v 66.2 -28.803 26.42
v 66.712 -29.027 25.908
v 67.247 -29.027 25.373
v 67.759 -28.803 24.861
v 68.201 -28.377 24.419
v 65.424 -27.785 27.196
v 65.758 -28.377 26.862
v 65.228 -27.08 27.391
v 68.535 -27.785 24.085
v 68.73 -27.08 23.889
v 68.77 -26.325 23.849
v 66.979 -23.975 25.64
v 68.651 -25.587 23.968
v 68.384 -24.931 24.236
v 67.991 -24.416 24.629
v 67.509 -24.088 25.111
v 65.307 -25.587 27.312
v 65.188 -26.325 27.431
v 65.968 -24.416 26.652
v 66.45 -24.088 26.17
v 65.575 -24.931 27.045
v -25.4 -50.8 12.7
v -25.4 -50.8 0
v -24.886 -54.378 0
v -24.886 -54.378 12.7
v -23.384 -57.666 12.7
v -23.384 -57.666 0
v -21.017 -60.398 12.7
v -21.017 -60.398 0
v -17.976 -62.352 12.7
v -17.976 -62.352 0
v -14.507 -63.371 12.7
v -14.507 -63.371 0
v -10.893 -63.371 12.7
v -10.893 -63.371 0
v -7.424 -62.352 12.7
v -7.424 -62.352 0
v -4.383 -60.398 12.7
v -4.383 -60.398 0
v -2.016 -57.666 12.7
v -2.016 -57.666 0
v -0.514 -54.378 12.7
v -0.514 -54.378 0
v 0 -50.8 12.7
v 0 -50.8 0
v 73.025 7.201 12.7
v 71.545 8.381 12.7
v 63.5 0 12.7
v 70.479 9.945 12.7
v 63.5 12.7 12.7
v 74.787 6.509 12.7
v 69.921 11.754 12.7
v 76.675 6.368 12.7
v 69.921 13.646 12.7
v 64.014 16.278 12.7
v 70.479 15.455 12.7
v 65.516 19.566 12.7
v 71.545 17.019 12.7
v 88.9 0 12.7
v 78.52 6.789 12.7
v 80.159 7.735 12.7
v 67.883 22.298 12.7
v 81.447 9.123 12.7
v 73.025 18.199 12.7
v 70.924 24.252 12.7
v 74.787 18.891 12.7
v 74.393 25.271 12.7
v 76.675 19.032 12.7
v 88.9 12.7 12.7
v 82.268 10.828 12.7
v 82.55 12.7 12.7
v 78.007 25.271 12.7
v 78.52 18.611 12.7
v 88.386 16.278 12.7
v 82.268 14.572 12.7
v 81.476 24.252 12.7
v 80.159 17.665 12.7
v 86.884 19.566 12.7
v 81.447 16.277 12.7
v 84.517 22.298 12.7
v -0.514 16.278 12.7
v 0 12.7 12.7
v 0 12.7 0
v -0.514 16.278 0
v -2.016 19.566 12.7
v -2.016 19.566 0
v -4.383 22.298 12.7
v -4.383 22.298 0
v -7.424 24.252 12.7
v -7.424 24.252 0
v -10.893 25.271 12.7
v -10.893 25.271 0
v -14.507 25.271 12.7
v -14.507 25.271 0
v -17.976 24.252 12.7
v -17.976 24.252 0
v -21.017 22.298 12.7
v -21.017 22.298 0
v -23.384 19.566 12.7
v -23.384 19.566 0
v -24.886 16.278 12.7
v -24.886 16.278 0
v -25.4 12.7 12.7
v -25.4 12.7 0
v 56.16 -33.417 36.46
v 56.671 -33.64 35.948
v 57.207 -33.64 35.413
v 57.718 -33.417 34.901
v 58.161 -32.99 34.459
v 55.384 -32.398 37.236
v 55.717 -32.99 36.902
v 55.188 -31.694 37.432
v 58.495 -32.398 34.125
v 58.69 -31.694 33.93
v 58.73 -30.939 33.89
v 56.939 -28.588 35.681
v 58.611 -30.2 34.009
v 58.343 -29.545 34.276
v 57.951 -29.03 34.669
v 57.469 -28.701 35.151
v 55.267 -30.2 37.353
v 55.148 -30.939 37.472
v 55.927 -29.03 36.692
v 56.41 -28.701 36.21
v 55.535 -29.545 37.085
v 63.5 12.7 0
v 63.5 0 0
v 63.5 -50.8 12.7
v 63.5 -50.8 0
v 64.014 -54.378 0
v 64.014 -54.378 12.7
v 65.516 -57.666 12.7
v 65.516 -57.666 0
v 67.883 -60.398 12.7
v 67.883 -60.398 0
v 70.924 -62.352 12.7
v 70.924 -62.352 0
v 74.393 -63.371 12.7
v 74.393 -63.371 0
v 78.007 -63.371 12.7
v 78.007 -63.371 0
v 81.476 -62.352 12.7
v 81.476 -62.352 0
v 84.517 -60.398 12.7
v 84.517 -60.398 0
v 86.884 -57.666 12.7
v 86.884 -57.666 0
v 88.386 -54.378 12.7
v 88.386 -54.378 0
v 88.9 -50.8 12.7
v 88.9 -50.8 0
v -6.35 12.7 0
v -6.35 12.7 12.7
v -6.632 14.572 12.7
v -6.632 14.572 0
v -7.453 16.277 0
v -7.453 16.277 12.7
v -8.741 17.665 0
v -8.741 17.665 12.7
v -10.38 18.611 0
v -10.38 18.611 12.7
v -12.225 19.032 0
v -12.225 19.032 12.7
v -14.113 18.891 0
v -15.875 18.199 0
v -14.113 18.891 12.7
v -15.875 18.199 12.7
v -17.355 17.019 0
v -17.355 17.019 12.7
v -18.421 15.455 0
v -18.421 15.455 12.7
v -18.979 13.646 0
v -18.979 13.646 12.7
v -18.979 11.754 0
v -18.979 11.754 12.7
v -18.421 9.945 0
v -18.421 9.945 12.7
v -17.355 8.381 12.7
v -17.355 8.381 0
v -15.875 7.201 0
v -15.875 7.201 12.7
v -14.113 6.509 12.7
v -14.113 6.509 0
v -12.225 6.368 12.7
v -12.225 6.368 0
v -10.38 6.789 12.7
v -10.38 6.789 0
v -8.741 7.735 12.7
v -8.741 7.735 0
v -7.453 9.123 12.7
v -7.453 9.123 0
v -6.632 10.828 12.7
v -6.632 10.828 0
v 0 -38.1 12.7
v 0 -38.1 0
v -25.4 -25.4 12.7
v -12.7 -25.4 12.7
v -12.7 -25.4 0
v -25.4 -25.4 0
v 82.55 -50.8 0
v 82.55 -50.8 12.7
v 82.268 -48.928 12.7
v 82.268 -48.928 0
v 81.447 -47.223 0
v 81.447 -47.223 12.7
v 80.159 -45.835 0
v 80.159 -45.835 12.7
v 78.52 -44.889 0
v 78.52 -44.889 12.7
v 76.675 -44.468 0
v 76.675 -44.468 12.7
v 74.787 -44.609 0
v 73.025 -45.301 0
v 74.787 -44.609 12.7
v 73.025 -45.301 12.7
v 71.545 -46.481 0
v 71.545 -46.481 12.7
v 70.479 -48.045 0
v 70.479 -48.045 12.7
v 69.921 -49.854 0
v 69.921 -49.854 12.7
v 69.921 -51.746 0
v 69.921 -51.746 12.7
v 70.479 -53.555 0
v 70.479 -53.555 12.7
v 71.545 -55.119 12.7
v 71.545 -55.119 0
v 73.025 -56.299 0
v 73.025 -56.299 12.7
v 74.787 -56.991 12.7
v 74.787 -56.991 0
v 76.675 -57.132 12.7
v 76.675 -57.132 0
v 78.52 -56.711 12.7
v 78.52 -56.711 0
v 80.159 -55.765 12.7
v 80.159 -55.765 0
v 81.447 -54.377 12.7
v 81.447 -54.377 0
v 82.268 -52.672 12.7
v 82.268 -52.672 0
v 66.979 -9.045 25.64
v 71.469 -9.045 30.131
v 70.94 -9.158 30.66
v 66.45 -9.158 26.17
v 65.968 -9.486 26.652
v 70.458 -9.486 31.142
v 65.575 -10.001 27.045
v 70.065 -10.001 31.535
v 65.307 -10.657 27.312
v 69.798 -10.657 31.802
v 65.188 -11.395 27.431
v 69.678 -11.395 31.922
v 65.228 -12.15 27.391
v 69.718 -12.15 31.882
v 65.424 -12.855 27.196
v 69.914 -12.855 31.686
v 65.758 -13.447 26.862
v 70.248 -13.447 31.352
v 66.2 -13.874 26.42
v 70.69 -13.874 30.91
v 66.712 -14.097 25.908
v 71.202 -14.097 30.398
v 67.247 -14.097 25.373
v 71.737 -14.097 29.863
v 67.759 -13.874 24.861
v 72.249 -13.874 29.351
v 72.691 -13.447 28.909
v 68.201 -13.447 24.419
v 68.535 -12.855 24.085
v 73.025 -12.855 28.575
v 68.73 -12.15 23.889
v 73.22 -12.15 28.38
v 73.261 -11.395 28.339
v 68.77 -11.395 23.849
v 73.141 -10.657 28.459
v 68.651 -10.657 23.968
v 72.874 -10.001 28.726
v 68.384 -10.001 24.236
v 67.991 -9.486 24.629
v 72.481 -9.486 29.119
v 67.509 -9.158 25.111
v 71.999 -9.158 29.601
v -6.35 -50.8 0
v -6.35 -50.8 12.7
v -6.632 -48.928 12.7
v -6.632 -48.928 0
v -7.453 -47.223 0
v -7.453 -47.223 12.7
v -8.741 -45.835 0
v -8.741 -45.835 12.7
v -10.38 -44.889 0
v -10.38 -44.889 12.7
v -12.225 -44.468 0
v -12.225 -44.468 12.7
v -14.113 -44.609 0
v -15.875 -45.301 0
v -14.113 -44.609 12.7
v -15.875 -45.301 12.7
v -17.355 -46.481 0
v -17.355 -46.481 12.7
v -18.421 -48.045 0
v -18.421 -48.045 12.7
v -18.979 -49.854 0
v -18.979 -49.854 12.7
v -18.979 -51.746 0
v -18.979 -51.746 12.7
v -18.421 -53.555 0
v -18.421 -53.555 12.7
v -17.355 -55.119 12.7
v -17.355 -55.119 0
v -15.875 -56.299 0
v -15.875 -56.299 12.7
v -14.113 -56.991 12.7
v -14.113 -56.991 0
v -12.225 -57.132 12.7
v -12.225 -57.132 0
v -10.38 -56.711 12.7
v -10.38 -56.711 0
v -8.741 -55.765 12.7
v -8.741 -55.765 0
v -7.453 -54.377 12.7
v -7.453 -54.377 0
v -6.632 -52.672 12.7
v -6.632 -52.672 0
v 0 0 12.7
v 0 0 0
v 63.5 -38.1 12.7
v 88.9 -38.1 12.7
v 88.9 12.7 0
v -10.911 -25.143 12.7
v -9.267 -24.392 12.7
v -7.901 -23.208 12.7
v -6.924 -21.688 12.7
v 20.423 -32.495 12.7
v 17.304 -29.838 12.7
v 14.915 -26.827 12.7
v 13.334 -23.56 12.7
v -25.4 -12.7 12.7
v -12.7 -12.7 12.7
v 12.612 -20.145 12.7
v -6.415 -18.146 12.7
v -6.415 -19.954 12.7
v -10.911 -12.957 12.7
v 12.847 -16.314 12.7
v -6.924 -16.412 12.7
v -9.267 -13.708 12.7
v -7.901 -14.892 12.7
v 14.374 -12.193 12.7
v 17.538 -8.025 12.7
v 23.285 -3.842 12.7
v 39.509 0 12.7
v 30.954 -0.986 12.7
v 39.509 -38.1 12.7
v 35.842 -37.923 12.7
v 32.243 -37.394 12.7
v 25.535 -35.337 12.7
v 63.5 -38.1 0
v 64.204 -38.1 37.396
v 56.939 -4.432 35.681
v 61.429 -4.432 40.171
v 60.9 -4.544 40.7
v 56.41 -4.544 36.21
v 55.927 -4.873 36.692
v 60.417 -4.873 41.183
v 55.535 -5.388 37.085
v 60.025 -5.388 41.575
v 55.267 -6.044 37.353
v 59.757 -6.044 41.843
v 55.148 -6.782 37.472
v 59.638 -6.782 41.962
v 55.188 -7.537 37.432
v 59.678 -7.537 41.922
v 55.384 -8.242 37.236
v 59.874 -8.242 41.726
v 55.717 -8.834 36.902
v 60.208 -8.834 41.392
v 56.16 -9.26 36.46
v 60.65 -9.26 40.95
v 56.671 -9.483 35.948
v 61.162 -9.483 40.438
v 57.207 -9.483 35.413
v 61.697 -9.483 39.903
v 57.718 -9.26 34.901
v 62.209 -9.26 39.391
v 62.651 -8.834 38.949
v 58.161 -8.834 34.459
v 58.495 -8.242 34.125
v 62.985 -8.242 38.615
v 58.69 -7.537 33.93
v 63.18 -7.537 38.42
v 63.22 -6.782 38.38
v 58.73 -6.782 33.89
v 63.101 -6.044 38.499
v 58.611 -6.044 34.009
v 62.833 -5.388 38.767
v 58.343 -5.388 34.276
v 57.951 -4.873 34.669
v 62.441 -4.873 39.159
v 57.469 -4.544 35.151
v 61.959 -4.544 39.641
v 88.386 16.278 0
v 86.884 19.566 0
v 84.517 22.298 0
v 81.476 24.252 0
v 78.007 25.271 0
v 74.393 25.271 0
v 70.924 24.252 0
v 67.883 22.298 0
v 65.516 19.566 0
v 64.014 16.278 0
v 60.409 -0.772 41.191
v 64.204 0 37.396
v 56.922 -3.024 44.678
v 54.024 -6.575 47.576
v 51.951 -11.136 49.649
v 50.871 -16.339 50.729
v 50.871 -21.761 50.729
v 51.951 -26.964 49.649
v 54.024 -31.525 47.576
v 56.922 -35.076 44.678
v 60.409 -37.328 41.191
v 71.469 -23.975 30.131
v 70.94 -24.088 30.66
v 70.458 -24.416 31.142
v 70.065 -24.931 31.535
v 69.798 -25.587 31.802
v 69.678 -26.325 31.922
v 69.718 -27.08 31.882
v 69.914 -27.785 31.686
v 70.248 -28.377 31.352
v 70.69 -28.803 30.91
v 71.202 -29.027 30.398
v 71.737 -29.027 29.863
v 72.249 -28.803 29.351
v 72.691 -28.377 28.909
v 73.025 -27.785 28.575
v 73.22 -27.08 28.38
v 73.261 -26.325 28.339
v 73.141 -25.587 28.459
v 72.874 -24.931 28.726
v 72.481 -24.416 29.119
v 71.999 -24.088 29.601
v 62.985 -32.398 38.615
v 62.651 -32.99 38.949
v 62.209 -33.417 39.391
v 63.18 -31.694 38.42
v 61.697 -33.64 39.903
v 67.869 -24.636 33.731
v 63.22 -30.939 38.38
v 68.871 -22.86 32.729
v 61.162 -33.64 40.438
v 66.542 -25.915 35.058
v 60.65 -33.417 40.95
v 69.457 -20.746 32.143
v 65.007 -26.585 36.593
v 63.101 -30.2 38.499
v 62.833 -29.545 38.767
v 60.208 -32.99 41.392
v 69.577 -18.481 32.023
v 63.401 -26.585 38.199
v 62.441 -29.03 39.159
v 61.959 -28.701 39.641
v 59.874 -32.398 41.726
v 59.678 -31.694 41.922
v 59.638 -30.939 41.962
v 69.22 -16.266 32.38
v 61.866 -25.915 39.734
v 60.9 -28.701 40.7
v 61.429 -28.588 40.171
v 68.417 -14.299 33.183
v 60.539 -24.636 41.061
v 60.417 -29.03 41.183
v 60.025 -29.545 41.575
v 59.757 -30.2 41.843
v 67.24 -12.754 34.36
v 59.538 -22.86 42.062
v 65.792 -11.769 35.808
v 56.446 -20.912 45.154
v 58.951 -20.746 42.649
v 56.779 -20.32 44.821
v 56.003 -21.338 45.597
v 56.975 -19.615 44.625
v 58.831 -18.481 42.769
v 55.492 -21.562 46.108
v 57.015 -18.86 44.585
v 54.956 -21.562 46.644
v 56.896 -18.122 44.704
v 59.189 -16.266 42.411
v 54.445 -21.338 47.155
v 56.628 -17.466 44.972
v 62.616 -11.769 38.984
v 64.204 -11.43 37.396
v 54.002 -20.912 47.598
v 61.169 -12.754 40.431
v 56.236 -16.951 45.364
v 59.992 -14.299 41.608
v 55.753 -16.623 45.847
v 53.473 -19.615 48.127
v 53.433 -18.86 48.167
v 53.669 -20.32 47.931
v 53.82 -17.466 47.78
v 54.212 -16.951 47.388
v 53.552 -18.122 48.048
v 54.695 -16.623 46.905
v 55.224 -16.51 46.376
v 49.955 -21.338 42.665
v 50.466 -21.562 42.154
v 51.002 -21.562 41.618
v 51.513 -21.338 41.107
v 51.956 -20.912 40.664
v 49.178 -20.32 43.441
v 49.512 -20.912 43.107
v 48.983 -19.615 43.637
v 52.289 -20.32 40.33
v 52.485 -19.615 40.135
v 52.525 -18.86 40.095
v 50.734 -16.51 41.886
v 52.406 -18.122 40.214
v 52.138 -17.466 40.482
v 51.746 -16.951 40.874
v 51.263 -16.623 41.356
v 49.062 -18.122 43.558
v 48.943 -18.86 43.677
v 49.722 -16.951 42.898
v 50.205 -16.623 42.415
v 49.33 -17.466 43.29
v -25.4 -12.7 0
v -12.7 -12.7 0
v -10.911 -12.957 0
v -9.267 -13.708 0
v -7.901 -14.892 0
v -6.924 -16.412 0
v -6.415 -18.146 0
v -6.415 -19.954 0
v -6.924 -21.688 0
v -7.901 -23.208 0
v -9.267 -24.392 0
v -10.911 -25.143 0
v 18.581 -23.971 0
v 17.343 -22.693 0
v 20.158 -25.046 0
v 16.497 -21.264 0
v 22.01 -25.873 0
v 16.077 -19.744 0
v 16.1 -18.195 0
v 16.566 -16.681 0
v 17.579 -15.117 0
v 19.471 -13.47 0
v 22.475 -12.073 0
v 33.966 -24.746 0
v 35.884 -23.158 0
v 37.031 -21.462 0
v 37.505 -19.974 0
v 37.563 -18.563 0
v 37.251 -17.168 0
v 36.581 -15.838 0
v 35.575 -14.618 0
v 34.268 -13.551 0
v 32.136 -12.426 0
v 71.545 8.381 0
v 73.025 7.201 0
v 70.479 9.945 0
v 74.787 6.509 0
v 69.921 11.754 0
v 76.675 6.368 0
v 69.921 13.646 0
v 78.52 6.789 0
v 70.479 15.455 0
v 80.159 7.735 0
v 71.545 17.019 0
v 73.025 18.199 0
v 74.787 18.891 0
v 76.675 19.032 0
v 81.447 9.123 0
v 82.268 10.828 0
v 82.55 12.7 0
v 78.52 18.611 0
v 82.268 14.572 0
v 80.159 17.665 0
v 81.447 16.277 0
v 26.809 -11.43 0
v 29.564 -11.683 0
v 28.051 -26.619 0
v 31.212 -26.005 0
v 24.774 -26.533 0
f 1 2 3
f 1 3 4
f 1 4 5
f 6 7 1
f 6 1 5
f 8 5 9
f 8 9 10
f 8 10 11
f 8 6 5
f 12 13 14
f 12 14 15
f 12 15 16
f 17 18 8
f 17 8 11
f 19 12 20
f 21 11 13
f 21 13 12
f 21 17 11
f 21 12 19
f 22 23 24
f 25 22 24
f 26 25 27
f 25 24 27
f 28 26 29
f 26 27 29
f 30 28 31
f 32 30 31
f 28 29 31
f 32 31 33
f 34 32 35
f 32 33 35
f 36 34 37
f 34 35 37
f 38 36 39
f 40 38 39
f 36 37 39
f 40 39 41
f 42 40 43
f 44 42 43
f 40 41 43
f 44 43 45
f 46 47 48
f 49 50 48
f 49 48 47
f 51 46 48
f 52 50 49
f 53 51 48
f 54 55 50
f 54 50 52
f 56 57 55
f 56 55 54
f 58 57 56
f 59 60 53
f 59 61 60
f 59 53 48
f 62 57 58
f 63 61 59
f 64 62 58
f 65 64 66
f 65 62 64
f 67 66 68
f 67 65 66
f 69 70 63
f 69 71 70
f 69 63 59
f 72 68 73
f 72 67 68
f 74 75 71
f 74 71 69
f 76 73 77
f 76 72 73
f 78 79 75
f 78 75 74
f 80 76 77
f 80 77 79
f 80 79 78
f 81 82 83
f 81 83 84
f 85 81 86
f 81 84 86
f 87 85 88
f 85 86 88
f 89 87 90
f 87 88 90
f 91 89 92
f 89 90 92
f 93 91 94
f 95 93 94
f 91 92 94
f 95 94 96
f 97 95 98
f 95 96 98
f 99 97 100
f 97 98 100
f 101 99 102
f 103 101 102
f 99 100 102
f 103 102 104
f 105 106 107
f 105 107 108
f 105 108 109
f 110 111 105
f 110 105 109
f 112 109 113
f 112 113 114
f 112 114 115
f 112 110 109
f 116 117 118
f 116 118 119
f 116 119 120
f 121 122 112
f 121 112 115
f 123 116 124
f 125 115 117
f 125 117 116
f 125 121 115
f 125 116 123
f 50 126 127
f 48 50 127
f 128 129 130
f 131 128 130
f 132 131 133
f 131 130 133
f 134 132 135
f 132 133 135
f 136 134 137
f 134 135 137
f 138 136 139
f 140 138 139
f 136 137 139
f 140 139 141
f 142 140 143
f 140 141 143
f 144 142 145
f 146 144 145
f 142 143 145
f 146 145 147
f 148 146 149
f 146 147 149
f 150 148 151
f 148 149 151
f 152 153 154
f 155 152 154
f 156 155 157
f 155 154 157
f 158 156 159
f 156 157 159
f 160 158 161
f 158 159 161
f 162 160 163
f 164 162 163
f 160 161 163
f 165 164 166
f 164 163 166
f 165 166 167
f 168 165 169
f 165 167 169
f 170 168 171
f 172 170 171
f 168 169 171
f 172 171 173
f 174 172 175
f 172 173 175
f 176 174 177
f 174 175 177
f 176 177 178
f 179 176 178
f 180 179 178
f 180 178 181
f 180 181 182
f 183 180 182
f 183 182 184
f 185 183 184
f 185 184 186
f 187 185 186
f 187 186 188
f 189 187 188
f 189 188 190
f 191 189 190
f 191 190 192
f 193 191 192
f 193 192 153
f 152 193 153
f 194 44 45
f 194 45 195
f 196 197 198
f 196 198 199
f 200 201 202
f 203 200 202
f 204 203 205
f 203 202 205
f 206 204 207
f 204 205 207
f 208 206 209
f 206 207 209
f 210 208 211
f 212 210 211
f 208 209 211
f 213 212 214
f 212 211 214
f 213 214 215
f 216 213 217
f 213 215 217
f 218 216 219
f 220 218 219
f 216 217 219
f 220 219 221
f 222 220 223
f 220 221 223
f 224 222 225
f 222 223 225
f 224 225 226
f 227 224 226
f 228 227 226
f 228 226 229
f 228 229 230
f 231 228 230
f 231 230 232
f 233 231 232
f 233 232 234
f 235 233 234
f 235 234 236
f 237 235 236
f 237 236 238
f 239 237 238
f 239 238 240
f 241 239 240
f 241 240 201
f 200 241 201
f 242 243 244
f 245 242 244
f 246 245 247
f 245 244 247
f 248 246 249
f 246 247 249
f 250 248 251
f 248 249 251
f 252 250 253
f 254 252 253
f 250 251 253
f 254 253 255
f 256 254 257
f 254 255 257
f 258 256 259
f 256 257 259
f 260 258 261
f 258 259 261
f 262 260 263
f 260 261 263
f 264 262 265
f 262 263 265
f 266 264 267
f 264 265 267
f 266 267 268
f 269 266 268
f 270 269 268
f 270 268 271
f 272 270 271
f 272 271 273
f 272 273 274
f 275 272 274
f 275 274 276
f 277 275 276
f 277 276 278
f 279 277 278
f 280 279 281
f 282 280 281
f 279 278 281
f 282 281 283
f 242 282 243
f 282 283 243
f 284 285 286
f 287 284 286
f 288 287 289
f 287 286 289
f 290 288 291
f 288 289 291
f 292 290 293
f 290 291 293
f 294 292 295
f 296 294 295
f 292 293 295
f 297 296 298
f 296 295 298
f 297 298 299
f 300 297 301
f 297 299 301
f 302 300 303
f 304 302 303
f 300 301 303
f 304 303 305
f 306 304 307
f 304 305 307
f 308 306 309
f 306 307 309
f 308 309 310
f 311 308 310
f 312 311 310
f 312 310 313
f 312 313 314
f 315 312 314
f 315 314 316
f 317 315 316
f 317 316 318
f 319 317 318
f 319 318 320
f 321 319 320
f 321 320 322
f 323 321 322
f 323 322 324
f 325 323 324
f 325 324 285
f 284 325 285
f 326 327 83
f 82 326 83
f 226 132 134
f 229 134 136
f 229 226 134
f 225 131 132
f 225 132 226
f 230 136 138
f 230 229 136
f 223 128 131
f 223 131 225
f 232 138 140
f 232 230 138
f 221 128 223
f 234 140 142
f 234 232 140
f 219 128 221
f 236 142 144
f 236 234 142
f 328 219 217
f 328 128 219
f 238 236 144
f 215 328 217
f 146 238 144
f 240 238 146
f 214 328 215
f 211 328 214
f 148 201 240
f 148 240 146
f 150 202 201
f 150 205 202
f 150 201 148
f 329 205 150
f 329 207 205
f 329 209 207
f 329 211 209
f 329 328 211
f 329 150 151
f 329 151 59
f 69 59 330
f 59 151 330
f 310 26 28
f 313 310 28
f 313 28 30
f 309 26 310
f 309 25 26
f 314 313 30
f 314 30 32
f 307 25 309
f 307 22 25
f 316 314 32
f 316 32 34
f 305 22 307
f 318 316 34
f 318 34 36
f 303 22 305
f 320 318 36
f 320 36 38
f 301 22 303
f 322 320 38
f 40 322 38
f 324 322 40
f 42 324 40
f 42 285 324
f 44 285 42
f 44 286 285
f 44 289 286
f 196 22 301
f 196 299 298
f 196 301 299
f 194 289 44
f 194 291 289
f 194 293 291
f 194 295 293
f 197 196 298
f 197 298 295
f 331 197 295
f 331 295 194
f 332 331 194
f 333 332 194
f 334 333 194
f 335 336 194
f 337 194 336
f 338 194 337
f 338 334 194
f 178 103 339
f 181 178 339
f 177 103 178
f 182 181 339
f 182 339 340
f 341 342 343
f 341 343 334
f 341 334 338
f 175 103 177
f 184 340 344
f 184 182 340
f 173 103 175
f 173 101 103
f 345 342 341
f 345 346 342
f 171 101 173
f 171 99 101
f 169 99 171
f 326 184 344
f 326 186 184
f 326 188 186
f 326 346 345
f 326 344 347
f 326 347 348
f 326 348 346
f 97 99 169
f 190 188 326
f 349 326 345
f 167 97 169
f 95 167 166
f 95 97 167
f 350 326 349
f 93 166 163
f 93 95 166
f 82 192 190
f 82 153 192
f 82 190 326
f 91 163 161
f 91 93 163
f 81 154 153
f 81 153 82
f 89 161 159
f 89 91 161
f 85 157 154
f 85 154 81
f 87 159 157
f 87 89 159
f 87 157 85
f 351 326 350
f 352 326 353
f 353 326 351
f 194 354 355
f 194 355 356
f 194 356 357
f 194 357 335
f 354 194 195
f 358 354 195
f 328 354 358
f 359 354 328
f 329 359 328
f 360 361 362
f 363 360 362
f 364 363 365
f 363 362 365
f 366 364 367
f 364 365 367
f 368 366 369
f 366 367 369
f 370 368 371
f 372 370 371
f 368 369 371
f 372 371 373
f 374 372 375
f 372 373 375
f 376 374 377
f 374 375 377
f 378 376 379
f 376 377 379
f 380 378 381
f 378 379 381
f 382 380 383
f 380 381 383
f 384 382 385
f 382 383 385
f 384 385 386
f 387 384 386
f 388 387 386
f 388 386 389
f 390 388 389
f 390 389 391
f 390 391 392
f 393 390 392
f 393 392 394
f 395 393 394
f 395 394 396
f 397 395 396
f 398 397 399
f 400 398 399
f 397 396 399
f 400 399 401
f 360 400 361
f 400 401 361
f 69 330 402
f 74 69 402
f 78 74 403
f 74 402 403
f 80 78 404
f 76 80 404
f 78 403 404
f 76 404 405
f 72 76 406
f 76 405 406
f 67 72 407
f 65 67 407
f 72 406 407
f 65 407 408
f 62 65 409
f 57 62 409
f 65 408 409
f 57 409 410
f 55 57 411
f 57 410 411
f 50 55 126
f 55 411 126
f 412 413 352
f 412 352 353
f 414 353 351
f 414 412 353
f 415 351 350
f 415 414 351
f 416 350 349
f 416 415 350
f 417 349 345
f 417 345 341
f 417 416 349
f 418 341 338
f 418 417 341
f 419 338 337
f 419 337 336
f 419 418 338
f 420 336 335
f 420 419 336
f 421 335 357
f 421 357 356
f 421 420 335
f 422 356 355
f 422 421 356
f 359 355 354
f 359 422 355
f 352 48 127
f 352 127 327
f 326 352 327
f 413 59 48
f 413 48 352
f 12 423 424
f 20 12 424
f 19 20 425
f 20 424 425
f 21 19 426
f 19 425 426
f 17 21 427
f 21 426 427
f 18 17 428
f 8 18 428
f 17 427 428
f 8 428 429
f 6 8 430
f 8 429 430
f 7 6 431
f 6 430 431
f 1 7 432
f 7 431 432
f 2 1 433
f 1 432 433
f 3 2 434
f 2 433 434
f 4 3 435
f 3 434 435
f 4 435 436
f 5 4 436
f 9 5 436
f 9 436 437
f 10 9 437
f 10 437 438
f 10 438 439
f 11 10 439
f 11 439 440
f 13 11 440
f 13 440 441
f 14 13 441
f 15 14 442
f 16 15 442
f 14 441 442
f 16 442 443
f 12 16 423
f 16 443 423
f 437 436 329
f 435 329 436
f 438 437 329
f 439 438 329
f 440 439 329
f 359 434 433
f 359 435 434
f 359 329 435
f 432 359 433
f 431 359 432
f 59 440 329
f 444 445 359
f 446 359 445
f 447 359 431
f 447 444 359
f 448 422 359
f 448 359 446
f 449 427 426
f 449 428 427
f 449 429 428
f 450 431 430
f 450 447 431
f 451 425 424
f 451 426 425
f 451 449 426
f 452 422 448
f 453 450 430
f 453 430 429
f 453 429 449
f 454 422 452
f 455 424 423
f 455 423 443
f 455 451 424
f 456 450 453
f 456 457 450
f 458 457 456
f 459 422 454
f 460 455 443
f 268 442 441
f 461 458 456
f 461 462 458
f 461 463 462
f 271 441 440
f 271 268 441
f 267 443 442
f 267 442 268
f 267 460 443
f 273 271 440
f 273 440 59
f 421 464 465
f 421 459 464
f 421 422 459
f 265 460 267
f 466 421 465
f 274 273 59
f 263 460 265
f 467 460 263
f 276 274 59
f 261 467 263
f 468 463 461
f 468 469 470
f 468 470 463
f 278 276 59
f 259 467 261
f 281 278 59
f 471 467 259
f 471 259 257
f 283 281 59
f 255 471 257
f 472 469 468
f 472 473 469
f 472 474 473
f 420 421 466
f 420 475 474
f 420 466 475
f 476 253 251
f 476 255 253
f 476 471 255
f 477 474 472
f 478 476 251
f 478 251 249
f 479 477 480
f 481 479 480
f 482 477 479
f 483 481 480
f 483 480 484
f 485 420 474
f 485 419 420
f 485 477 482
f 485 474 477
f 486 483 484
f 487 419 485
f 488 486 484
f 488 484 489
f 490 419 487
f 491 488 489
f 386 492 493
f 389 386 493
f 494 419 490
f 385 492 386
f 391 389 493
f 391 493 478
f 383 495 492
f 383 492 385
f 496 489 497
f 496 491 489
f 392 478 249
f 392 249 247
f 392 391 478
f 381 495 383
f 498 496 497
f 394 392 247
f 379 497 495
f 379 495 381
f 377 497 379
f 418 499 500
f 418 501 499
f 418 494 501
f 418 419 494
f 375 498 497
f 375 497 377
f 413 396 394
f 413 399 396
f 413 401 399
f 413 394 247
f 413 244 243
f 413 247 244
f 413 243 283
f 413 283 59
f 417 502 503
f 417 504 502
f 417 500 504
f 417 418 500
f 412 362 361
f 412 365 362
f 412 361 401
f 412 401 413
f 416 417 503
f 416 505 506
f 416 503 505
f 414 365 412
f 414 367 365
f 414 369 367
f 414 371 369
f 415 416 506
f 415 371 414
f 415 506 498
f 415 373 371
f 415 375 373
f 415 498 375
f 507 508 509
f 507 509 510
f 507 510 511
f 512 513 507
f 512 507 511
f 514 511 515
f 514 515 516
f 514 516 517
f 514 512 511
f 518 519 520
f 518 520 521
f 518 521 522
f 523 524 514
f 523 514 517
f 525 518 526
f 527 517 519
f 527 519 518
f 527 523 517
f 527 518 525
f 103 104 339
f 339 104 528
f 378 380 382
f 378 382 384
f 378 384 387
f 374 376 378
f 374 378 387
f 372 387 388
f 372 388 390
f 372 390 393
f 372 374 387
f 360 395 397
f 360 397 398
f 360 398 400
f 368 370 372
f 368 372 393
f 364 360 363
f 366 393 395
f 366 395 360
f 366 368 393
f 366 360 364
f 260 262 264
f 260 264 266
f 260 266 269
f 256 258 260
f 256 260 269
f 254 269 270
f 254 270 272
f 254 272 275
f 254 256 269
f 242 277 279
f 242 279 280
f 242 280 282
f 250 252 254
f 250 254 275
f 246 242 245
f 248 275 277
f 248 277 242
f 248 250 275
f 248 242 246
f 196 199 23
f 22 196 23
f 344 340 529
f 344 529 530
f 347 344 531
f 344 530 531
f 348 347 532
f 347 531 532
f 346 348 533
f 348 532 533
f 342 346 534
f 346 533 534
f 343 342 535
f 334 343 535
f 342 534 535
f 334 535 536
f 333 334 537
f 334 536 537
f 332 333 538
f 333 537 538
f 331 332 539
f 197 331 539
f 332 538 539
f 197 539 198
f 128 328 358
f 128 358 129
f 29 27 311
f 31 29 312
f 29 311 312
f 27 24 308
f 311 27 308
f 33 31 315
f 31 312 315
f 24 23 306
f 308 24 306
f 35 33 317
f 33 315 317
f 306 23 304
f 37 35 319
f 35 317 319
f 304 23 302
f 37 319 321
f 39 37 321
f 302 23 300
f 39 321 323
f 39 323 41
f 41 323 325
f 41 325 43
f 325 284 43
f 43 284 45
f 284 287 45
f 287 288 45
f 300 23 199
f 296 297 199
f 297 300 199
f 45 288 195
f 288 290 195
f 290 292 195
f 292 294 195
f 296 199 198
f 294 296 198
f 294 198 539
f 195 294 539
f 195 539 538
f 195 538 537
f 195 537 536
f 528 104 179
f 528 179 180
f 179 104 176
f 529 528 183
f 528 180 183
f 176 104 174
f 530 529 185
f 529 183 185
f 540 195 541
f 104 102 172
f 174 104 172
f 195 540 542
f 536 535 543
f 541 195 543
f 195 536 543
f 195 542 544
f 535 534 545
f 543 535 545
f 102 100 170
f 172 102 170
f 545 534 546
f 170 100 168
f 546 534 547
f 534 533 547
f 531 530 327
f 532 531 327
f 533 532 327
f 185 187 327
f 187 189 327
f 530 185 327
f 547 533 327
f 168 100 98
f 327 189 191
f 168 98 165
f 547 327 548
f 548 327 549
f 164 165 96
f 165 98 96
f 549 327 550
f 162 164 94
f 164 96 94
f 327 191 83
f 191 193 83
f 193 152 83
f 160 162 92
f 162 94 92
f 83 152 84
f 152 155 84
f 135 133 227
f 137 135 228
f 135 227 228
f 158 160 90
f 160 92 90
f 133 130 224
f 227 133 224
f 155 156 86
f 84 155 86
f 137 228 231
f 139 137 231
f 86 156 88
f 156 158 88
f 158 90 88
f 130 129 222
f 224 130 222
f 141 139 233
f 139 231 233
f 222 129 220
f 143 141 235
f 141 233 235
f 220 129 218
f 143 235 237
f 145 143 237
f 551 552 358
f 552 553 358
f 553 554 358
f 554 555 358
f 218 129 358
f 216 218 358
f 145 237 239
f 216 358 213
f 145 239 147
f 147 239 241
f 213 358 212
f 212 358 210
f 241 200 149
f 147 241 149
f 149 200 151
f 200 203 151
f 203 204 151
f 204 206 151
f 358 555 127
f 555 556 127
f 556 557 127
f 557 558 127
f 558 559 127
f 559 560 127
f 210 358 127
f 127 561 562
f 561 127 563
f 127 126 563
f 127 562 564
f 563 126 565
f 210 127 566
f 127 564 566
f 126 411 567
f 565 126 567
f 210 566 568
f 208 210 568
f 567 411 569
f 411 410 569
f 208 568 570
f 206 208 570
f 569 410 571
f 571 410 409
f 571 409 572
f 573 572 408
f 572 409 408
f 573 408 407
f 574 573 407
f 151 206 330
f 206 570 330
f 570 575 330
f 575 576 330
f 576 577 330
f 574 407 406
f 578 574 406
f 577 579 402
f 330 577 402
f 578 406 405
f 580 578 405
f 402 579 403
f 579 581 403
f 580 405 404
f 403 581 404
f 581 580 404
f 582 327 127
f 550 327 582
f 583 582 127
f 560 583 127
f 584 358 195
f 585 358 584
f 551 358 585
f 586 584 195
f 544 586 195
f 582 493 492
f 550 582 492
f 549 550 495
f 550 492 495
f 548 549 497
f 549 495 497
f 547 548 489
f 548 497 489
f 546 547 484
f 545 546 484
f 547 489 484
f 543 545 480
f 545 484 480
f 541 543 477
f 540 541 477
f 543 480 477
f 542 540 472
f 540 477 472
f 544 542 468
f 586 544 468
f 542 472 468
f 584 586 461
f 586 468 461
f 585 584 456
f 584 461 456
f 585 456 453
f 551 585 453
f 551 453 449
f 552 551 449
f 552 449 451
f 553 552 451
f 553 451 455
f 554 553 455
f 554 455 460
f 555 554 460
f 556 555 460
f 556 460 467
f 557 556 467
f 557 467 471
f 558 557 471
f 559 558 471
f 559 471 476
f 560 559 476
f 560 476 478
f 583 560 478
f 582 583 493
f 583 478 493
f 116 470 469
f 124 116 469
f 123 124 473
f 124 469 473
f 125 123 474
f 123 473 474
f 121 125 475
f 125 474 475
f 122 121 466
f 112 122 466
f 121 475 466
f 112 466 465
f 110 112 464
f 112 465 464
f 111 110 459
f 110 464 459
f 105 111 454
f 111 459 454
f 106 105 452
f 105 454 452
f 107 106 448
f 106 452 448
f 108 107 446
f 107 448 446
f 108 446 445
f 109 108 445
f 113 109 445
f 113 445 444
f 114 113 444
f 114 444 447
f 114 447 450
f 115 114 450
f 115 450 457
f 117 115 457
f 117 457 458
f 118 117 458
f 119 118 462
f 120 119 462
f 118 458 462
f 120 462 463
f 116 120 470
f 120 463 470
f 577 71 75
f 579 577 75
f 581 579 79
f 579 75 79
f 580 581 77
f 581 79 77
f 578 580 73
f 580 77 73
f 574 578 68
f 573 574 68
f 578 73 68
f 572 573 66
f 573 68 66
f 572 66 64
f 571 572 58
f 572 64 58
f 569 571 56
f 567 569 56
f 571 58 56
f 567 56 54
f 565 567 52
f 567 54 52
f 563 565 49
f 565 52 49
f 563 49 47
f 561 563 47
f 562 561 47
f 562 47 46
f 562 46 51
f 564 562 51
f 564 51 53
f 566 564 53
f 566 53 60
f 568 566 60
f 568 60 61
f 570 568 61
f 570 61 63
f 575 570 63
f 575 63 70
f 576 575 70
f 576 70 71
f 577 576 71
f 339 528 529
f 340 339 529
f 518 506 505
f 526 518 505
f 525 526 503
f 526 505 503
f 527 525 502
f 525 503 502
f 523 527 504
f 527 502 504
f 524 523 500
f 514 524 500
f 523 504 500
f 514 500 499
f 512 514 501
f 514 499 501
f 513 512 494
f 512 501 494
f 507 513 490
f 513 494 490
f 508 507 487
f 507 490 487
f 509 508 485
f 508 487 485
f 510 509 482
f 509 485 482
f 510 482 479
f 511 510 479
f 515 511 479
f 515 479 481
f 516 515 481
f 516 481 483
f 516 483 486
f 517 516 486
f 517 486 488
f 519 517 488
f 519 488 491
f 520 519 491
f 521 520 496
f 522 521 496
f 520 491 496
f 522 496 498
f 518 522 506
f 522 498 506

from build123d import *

# Parameters (mm, degrees)
F1_DEPTH          = 12.7
F2_R              = 6.35
F3_DEPTH          = 12.701
F8_R              = 7.62
F9_DEPTH          = 89.8035612107
F10_R             = 2.54
F11_DEPTH         = 6.35
F11_COPIES_COUNT  = 2
F11_COPIES_PITCH  = 14.929745
F11_COPIES1_COUNT = 2
F11_COPIES1_PITCH = 14.929745
F11_COPIES2_COUNT = 2
F11_COPIES2_PITCH = 24.156836
F11_COPIES3_COUNT = 2
F11_COPIES3_PITCH = 24.156836


# Not quite as in the source:
# - a pattern or mirror of a feature is missing from the dataset's text; its kind, count and spacing are read off the source's solid


with BuildPart() as f1:
    # F0 (on Top) → F1 (new body)
    with BuildSketch(Plane.XY):
        with BuildLine():
            Line((63.5, 0), (0, 0))
            Line((0, 0), (0, 12.7))
            ThreePointArc((0, 12.7), (-12.7, 25.4), (-25.4, 12.7))
            Line((-25.4, 12.7), (-25.4, -12.7))
            Line((-25.4, -12.7), (-12.7, -12.7))
            ThreePointArc((-12.7, -12.7), (-6.35, -19.05), (-12.7, -25.4))
            Line((-12.7, -25.4), (-25.4, -25.4))
            Line((-25.4, -25.4), (-25.4, -50.8))
            ThreePointArc((-25.4, -50.8), (-12.7, -63.5), (0, -50.8))
            Line((0, -50.8), (0, -38.1))
            Line((0, -38.1), (63.5, -38.1))
            Line((63.5, -38.1), (63.5, -50.8))
            ThreePointArc((63.5, -50.8), (76.2, -63.5), (88.9, -50.8))
            Line((88.9, -50.8), (88.9, 12.7))
            ThreePointArc((88.9, 12.7), (76.2, 25.4), (63.5, 12.7))
            Line((63.5, 12.7), (63.5, 0))
        make_face()
    extrude(amount=F1_DEPTH)

    # F2 (on face) → F3 (cut, through all)
    with BuildSketch(Plane.XY.offset(12.7)):
        with Locations((-12.7, 12.7)):
            Circle(F2_R)
        with Locations((76.2, 12.7)):
            Circle(F2_R)
        with Locations((76.2, -50.8)):
            Circle(F2_R)
        with Locations((-12.7, -50.8)):
            Circle(F2_R)
    extrude(amount=-F3_DEPTH, mode=Mode.SUBTRACT)

    # F6 (on face) → F7 (join, up to the next surface of F1)
    with BuildSketch(Plane(origin=(50.8, 0, 50.8), x_dir=(0, 1, 0), z_dir=(0.7071067812, 0, 0.7071067812))):
        with BuildLine():
            Line((-38.1, -18.9565367084), (-38.1, -53.8815367264))
            Line((-38.1, -53.8815367264), (0, -53.8815367264))
            Line((0, -53.8815367264), (0, -18.9565360082))
            ThreePointArc((0, -18.9565360082), (-19.0500003501, 0.0934632736), (-38.1, -18.9565367084))
        make_face()
    extrude(until=Until.NEXT, dir=(-0.7071067812, 0, -0.7071067812))

    # F8 (on face) → F9 (cut, through all)
    with BuildSketch(Plane(origin=(50.8, 0, 50.8), x_dir=(0, 1, 0), z_dir=(0.7071067812, 0, 0.7071067812))):
        with Locations((-19.05, -18.9565367264)):
            Circle(F8_R)
    extrude(amount=-F9_DEPTH, mode=Mode.SUBTRACT)

    # F10 (on face) → F11 (cut)
    with BuildSketch(Plane(origin=(50.8, 0, 50.8), x_dir=(0, 1, 0), z_dir=(0.7071067812, 0, 0.7071067812))):
        with Locations((-19.05, -6.2565367264)):
            Circle(F10_R)
    f11 = extrude(amount=-F11_DEPTH, mode=Mode.SUBTRACT)

    # F11_copies: F11 ×2
    with Locations(*[Vector(0.4156269378, -0.8090169944, -0.4156269378) * (i * F11_COPIES_PITCH) for i in range(1, F11_COPIES_COUNT)]):
        add(f11, mode=Mode.SUBTRACT)

    # F11_copies1: F11 ×2
    with Locations(*[Vector(0.4156269378, 0.8090169944, -0.4156269378) * (i * F11_COPIES1_PITCH) for i in range(1, F11_COPIES1_COUNT)]):
        add(f11, mode=Mode.SUBTRACT)

    # F11_copies2: F11 ×2
    with Locations(*[Vector(0.672498512, 0.3090169944, -0.672498512) * (i * F11_COPIES2_PITCH) for i in range(1, F11_COPIES2_COUNT)]):
        add(f11, mode=Mode.SUBTRACT)

    # F11_copies3: F11 ×2
    with Locations(*[Vector(0.672498512, -0.3090169944, -0.672498512) * (i * F11_COPIES3_PITCH) for i in range(1, F11_COPIES3_COUNT)]):
        add(f11, mode=Mode.SUBTRACT)


solid = f1.part
